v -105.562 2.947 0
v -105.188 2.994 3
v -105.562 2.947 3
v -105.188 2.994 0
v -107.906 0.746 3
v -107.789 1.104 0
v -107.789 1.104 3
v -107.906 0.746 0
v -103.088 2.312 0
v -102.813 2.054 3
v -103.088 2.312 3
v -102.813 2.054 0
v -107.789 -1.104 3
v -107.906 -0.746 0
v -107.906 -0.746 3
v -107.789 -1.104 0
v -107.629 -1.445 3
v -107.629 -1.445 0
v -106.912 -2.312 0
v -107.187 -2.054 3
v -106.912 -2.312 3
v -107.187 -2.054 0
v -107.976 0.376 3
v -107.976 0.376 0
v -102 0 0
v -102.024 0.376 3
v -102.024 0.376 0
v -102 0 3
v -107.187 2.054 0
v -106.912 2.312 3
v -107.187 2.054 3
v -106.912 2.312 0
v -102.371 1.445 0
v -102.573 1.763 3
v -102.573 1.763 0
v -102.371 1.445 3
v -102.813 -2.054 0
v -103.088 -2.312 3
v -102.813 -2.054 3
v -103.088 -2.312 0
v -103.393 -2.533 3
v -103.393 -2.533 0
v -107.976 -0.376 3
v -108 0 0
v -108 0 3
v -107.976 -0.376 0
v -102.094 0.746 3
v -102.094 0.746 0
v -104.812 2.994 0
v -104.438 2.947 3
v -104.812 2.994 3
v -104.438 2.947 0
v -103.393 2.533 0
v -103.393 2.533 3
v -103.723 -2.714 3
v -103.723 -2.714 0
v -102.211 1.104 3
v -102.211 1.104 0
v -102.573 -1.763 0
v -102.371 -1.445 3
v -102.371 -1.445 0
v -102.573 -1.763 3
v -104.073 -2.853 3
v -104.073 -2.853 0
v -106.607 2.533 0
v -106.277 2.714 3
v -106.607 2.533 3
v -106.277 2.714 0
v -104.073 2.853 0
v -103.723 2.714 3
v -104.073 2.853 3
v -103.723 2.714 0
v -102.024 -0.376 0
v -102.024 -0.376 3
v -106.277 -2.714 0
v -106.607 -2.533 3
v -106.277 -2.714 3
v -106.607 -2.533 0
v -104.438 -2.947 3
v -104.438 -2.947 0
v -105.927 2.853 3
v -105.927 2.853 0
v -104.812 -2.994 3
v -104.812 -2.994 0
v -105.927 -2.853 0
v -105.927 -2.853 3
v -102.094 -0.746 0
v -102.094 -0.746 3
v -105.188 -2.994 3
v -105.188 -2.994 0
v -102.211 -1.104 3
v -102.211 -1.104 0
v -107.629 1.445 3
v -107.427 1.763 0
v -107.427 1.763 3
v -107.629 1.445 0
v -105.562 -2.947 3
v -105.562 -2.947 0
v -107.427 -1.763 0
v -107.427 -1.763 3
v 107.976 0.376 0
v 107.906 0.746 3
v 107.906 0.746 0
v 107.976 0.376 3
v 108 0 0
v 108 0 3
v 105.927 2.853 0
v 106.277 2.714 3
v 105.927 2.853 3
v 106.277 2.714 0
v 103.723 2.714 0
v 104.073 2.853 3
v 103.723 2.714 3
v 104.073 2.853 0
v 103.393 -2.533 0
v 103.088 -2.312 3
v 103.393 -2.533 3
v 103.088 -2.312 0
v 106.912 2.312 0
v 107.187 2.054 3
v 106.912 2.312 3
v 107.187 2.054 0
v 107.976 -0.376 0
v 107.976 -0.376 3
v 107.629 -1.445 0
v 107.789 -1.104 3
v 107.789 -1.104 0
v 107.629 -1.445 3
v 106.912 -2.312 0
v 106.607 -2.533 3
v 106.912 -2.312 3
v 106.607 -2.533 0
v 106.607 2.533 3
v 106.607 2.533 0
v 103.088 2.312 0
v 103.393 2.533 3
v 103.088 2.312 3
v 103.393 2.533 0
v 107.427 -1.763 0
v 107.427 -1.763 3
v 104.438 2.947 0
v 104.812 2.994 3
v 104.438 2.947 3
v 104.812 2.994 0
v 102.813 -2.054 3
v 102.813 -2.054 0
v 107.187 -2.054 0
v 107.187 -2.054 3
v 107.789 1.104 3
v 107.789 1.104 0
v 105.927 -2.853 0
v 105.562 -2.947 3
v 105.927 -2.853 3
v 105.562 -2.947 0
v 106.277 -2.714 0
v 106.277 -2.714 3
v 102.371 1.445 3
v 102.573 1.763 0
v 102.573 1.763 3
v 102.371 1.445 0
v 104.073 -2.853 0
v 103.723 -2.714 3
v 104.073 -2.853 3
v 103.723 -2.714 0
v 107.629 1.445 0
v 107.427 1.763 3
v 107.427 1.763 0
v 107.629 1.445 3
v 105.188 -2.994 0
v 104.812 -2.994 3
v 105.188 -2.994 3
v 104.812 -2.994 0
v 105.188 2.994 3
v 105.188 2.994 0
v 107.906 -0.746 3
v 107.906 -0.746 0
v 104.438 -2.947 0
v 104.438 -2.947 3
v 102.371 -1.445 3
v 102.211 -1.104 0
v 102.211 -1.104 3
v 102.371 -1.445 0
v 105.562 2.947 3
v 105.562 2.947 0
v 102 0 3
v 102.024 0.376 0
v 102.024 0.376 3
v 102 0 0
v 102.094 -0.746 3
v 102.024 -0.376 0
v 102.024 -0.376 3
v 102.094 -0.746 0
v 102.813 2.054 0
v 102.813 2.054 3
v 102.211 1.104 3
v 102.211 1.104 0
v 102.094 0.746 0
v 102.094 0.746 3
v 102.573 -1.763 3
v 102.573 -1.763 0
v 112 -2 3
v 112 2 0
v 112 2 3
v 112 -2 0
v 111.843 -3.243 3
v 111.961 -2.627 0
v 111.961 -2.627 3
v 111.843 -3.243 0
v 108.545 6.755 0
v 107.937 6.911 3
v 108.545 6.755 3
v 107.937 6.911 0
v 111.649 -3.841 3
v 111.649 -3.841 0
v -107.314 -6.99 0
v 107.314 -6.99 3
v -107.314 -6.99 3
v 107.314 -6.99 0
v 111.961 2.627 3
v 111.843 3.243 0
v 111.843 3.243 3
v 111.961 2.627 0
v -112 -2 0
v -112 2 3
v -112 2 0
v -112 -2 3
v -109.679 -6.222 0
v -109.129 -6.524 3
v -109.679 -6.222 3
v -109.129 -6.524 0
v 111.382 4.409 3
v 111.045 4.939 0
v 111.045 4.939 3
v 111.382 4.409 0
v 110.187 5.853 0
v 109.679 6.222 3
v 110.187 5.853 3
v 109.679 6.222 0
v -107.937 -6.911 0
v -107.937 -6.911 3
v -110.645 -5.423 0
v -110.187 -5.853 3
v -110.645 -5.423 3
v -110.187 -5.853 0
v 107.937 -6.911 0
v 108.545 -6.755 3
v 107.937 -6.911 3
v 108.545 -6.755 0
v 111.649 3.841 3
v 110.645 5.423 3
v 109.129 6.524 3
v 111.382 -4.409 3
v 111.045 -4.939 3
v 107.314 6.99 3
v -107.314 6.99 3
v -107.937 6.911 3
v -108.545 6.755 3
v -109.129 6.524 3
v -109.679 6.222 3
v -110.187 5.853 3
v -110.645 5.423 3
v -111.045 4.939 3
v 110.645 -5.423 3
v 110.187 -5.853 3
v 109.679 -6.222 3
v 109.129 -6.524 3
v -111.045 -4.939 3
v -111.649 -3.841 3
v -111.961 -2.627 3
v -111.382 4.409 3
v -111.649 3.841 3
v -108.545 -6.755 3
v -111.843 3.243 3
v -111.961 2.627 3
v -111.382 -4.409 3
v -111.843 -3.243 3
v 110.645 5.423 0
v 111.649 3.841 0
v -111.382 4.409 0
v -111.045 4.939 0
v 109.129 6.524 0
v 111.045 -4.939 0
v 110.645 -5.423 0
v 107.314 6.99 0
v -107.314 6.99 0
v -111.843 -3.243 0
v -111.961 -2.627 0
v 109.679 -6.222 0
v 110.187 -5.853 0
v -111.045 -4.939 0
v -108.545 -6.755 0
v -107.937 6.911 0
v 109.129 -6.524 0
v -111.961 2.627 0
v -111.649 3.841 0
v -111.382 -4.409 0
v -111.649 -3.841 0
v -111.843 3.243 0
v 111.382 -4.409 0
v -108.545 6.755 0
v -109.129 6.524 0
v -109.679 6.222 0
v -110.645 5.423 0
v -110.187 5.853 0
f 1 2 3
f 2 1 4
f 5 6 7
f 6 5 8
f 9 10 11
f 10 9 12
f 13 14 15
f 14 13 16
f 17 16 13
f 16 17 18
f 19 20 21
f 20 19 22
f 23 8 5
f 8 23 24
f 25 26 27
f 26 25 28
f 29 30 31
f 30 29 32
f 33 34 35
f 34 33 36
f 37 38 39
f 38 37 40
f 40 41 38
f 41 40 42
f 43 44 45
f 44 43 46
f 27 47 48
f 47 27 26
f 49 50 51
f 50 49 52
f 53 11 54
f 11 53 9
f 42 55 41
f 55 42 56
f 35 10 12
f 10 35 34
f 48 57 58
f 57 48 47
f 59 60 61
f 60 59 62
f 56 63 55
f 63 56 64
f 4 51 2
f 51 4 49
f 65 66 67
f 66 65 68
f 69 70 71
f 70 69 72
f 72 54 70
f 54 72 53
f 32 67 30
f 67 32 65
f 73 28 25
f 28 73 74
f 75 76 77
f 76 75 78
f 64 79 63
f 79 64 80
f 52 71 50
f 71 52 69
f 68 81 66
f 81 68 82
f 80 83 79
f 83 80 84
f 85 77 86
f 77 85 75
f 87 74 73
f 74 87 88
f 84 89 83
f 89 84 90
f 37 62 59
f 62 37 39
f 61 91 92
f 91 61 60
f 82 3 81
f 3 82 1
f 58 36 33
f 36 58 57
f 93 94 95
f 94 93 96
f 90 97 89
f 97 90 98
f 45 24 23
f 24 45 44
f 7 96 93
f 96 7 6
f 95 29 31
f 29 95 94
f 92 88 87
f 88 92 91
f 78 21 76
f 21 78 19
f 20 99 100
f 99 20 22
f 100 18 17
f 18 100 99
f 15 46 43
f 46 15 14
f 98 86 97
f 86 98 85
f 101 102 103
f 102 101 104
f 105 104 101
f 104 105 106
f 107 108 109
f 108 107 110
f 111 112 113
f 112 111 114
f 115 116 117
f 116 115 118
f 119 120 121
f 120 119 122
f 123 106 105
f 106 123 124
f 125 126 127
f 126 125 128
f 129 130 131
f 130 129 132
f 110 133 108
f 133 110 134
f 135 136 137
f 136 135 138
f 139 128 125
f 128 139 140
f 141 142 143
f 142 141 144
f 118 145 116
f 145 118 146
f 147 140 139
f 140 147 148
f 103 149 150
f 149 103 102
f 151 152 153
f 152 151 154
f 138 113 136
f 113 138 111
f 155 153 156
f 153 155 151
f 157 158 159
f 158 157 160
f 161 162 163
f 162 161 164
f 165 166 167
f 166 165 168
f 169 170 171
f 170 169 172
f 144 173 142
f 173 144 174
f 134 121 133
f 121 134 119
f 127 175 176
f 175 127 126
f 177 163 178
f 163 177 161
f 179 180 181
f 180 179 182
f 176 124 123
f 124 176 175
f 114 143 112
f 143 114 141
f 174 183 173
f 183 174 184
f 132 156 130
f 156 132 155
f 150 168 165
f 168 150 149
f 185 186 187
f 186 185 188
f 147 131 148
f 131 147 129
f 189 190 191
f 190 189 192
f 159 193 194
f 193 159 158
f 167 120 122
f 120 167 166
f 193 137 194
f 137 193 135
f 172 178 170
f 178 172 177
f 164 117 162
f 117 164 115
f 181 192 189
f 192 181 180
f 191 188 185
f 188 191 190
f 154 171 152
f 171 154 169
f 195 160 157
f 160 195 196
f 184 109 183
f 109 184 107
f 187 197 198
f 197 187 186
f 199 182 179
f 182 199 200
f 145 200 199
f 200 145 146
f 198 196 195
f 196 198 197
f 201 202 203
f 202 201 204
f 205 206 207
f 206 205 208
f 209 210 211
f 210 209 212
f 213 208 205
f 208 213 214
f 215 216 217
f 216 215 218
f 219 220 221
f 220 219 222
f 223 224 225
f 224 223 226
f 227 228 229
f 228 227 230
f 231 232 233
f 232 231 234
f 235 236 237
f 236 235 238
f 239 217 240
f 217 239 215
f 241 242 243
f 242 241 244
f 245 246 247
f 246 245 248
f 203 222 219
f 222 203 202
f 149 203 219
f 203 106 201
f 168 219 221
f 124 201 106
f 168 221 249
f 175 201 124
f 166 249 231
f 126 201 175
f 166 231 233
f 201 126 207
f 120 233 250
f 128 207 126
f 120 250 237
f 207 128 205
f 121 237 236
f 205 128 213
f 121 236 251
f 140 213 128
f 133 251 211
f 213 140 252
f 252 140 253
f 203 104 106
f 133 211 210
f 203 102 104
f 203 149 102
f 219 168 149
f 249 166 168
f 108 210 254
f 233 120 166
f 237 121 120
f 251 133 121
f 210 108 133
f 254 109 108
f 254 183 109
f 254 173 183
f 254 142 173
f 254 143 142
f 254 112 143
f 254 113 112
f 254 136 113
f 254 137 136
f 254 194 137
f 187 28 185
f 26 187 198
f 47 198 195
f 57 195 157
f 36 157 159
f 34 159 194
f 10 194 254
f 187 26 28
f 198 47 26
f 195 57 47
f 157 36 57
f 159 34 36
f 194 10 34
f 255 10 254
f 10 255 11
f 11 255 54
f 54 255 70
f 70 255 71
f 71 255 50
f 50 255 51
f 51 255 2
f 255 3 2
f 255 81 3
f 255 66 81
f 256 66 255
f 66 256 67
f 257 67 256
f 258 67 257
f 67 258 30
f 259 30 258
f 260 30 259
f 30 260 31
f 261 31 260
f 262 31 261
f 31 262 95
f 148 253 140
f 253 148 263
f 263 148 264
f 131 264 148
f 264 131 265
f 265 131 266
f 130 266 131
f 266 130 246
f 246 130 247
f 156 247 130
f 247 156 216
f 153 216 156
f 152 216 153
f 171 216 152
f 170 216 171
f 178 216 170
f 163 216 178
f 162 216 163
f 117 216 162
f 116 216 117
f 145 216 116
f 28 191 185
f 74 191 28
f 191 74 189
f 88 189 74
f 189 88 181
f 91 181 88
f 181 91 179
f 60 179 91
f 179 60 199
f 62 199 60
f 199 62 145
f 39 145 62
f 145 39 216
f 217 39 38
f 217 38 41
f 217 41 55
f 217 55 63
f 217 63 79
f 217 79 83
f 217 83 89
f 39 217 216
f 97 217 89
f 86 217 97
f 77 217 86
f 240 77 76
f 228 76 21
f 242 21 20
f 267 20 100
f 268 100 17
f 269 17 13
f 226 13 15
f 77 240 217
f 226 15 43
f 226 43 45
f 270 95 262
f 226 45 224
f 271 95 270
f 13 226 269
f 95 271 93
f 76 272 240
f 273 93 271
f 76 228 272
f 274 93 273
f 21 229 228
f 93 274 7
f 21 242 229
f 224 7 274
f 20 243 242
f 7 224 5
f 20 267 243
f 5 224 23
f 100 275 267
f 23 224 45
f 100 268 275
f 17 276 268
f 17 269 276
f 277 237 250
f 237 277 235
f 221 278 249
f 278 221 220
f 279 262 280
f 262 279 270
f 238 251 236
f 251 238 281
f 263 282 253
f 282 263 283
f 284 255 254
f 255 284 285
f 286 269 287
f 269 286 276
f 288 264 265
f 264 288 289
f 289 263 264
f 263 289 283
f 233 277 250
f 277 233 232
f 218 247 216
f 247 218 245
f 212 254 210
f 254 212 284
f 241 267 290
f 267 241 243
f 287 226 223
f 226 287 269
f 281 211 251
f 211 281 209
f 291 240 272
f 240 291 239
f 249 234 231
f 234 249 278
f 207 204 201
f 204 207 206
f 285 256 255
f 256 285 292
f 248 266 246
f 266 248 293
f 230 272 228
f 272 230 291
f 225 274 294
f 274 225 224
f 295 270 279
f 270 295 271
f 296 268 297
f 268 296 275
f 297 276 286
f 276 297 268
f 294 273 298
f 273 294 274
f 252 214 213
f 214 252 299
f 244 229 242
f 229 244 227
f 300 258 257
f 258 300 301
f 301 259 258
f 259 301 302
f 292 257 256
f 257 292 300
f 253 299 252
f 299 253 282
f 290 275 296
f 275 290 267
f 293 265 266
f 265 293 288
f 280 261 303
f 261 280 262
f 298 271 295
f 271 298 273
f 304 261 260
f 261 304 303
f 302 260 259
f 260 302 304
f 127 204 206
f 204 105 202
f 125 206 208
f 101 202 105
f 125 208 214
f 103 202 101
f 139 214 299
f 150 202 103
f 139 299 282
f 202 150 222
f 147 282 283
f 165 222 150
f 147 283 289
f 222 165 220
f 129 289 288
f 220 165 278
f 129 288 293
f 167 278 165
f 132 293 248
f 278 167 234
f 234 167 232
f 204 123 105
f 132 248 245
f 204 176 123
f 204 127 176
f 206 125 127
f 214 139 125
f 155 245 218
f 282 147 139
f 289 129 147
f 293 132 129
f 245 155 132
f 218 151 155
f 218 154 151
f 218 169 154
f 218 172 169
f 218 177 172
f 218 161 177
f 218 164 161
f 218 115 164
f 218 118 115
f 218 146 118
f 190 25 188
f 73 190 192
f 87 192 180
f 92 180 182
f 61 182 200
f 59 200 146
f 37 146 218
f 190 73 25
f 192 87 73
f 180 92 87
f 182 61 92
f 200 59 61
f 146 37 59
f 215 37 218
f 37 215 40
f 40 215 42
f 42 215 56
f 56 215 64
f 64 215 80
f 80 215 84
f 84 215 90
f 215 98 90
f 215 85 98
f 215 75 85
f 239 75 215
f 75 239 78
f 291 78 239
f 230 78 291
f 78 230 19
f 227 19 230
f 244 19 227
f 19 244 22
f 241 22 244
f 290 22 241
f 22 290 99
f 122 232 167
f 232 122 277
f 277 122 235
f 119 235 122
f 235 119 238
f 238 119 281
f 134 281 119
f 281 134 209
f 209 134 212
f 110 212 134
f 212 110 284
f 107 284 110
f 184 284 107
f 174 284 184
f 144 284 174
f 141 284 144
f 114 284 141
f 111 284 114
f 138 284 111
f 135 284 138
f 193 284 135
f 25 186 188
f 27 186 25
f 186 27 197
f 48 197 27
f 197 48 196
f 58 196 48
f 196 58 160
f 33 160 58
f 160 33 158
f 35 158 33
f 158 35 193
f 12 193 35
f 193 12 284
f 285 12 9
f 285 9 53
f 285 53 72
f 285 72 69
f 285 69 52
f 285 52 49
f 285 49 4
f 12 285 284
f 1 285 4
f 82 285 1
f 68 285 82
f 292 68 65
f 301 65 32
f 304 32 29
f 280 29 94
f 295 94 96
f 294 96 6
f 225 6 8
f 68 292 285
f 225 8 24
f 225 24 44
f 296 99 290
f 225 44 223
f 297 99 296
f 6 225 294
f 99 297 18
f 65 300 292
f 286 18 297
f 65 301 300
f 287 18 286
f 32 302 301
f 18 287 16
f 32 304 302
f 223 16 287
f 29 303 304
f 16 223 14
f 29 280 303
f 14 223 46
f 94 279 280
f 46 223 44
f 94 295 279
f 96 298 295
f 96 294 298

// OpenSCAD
$fn = 50;


difference() {
	union() {
		hull() {
			translate(v = [-107.0000000000, 2.0000000000, 0]) {
				cylinder(h = 3, r = 5);
			}
			translate(v = [107.0000000000, 2.0000000000, 0]) {
				cylinder(h = 3, r = 5);
			}
			translate(v = [-107.0000000000, -2.0000000000, 0]) {
				cylinder(h = 3, r = 5);
			}
			translate(v = [107.0000000000, -2.0000000000, 0]) {
				cylinder(h = 3, r = 5);
			}
		}
	}
	union() {
		translate(v = [-105.0000000000, 0.0000000000, -100.0000000000]) {
			cylinder(h = 200, r = 3.0000000000);
		}
		translate(v = [-105.0000000000, 0.0000000000, -100.0000000000]) {
			cylinder(h = 200, r = 3.0000000000);
		}
		translate(v = [105.0000000000, 0.0000000000, -100.0000000000]) {
			cylinder(h = 200, r = 3.0000000000);
		}
		translate(v = [105.0000000000, 0.0000000000, -100.0000000000]) {
			cylinder(h = 200, r = 3.0000000000);
		}
	}
}
